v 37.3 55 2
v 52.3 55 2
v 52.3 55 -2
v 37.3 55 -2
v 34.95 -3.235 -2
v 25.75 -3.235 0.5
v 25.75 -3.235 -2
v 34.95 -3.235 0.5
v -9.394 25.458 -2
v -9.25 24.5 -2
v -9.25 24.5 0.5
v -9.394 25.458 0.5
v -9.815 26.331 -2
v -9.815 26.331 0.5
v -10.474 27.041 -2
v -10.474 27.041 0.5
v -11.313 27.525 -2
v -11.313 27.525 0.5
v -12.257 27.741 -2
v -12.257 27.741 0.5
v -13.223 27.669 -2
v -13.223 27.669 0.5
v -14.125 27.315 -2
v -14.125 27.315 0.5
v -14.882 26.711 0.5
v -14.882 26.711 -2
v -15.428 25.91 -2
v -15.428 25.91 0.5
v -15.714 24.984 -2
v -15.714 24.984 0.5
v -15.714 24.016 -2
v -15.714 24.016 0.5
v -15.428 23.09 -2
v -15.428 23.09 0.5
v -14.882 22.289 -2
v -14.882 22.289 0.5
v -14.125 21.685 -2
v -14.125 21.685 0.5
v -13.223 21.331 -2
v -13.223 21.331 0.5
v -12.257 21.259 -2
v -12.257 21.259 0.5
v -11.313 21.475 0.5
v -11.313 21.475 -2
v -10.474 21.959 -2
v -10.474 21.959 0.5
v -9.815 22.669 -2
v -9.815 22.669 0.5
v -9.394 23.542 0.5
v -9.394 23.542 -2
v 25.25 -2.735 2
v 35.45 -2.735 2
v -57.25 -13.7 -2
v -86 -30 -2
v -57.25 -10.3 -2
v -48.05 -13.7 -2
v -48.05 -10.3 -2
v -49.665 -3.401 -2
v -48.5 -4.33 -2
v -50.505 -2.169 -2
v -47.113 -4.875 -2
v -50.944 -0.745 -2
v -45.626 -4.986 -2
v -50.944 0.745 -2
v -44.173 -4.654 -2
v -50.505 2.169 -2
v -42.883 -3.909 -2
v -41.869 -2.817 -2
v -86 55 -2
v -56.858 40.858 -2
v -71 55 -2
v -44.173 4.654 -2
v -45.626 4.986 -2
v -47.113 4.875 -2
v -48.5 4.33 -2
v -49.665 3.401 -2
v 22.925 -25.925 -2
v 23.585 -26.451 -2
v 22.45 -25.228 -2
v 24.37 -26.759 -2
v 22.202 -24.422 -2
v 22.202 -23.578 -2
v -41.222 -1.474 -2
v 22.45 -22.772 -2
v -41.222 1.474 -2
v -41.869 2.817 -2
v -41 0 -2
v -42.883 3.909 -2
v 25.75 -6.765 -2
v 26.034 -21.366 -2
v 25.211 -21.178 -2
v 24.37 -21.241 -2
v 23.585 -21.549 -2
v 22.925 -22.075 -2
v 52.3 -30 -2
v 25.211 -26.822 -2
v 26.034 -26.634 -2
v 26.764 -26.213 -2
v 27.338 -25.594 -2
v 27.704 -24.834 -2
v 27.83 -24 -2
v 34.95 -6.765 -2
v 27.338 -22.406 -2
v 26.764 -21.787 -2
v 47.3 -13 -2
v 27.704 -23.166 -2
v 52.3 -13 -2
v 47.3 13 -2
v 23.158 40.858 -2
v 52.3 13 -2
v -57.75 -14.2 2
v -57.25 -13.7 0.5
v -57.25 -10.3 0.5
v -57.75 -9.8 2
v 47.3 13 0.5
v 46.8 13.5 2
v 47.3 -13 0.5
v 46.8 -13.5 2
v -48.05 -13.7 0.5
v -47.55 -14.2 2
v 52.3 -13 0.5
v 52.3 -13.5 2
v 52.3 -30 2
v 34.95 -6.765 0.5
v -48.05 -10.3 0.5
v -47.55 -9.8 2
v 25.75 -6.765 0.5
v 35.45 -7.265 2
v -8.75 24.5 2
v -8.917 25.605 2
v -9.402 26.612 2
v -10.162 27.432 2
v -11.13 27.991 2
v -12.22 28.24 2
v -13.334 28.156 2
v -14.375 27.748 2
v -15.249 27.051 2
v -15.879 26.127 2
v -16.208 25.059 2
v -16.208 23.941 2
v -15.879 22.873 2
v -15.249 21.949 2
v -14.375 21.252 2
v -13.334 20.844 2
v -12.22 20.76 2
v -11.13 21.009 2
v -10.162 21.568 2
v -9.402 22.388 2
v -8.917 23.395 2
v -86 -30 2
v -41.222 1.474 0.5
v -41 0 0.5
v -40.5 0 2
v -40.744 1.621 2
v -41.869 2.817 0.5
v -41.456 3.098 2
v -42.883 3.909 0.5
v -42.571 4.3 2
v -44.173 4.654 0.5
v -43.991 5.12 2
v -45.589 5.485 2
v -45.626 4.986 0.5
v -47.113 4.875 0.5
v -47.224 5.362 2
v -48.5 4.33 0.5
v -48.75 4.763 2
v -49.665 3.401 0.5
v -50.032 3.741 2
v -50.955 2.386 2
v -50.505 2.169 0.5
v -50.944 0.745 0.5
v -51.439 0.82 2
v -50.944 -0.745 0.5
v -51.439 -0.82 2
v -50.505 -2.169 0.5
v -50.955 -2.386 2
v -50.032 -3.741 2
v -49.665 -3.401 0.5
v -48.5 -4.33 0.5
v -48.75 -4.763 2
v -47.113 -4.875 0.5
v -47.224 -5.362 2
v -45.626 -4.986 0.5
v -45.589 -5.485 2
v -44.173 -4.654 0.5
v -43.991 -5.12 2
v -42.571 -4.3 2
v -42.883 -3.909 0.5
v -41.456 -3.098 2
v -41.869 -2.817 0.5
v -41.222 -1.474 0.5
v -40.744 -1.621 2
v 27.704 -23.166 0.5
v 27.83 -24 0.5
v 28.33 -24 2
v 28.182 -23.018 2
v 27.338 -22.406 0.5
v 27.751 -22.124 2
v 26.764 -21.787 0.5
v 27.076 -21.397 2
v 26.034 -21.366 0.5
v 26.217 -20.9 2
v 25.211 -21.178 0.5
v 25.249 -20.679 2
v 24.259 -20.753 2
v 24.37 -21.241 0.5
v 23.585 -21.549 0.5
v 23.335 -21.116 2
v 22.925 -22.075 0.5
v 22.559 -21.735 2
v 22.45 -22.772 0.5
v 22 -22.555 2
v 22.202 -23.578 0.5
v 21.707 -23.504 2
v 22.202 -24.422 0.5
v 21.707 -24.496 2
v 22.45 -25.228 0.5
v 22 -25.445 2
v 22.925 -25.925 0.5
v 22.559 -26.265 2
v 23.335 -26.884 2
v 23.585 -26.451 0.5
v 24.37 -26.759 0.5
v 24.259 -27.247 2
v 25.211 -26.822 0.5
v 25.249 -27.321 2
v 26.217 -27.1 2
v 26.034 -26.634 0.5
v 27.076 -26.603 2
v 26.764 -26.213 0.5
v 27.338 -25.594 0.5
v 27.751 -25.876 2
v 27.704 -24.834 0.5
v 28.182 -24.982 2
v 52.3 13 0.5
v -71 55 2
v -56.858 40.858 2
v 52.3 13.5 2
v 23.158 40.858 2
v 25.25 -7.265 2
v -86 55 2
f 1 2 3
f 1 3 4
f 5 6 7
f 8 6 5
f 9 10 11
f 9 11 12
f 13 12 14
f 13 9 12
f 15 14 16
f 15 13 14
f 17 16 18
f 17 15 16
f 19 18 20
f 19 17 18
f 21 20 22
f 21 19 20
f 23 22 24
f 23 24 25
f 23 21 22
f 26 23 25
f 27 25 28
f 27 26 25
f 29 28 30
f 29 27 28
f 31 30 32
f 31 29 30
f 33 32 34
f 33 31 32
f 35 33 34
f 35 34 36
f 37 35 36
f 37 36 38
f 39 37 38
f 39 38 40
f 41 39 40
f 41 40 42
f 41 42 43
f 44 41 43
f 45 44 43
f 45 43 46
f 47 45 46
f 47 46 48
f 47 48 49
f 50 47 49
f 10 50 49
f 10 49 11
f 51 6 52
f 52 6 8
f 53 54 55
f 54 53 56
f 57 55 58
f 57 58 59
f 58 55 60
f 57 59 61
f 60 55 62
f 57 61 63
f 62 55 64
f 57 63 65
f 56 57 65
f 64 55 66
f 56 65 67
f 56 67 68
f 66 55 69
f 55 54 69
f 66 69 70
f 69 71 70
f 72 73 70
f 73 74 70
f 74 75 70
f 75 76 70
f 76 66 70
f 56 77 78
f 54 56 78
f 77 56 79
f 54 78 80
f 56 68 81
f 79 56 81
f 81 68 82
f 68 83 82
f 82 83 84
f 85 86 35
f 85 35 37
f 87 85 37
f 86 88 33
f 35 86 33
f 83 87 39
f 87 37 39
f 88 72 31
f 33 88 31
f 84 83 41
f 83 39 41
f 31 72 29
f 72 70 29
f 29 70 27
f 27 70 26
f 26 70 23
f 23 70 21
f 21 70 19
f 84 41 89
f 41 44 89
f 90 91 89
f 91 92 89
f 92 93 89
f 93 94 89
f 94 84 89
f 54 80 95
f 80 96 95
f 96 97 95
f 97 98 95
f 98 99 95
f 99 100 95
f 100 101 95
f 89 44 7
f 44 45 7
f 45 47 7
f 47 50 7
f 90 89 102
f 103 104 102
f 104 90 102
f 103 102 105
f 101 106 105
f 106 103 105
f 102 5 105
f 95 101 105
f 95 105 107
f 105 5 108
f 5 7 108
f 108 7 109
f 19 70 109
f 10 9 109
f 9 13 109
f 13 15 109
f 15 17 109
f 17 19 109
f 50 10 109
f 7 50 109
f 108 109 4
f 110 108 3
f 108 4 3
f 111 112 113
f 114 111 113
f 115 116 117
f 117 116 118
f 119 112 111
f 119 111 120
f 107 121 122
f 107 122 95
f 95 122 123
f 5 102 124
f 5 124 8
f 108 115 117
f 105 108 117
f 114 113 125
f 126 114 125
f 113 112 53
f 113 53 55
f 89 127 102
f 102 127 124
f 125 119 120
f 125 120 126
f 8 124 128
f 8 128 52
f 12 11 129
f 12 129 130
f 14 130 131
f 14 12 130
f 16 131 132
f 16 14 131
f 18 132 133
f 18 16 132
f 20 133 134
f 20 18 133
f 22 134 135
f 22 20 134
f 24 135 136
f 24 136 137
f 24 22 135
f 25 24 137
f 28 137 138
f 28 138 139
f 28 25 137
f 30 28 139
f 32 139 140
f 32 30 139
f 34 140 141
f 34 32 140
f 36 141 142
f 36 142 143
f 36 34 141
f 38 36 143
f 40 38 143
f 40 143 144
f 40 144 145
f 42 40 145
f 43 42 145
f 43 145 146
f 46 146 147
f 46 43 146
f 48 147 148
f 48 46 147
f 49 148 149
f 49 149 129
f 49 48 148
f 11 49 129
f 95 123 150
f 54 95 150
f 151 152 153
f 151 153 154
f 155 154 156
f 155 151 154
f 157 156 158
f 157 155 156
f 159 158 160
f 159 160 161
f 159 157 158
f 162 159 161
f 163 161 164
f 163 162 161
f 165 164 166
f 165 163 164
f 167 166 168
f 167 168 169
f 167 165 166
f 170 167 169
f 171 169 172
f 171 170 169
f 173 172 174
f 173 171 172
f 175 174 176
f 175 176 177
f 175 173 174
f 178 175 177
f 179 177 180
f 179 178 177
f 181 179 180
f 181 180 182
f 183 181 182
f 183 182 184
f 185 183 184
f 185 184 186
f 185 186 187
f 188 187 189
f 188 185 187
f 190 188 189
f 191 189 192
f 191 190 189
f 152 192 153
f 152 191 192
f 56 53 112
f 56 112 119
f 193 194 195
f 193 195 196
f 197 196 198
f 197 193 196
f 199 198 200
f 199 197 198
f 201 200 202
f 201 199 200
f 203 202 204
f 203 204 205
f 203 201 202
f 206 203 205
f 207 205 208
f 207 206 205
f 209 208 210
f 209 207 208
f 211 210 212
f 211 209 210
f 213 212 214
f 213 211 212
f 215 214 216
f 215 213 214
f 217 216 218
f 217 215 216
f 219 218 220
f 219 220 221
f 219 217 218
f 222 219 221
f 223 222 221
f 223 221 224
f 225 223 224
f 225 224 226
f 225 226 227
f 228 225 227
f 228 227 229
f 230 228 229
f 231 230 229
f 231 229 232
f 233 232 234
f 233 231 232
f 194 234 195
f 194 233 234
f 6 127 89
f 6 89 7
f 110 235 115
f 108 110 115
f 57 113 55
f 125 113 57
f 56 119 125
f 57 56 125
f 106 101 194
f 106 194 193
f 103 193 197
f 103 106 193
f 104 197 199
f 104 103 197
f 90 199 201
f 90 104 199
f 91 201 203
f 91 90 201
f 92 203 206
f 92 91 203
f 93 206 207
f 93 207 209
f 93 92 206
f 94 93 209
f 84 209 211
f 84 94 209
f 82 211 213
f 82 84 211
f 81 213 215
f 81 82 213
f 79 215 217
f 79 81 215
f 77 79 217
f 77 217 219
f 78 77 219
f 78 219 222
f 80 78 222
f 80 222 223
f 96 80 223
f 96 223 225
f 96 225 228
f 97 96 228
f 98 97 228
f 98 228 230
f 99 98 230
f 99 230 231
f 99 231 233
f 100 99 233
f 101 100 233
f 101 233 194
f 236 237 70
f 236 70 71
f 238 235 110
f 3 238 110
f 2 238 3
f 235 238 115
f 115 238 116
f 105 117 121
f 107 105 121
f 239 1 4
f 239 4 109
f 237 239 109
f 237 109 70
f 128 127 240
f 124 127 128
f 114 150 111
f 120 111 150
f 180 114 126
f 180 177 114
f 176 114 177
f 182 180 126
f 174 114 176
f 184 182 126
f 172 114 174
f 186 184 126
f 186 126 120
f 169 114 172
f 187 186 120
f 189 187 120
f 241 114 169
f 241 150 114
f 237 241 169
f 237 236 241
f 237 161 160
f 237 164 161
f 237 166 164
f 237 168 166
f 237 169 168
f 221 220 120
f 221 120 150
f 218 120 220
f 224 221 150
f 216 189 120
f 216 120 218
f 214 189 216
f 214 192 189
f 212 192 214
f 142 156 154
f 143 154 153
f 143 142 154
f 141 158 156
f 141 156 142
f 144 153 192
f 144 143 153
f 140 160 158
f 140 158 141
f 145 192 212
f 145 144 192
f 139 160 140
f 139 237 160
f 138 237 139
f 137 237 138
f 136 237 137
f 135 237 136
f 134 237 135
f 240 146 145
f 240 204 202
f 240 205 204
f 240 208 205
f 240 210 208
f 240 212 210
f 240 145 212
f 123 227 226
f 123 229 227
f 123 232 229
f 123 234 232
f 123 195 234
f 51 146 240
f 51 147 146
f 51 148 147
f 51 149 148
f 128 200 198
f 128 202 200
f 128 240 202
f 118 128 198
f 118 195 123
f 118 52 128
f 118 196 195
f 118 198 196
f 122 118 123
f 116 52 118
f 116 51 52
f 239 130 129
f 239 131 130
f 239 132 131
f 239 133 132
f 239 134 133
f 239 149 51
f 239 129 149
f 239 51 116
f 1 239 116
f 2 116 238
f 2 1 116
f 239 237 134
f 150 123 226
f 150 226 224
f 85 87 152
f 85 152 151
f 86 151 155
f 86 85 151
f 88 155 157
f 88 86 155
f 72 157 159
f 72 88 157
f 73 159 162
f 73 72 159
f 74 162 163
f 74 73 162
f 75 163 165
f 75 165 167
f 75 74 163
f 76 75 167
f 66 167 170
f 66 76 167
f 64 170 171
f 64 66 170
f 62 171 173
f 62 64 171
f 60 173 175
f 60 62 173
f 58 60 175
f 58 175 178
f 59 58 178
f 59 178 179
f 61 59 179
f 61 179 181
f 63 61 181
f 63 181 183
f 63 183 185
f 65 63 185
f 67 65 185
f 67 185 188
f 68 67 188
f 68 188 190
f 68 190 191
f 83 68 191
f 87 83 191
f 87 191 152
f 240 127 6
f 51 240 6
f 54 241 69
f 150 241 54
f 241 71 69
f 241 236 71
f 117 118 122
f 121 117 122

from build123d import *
from OCP.BRepFilletAPI import BRepFilletAPI_MakeChamfer

# Parameters (mm, degrees)
SKETCH1_R           = 5
SKETCH1_R_2         = 2.83
SKETCH1_R_3         = 3.25
SKETCH1_W           = 9.2
SKETCH1_H           = 3.53
SKETCH1_H_2         = 3.4
BOSS_EXTRUDE1_DEPTH = 2
BOSS_EXTRUDE2_DEPTH = 2
CHAMFER1_SIZE       = 0.5
CHAMFER1_SIZE2      = 1.5
CHAMFER2_SIZE       = 1.5
CHAMFER2_SIZE2      = 0.5


with BuildPart() as part:
    # Sketch1 → Boss-Extrude1 (new, symmetric)
    with BuildSketch(Plane.XY):
        Polygon((-86, -30), (-86, 30), (52.3, 30), (52.3, 13), (47.3, 13), (47.3, -13), (52.3, -13), (52.3, -30), align=None)
        with Locations((-46, 0)):
            Circle(SKETCH1_R, mode=Mode.SUBTRACT)
        with Locations((25, -24)):
            Circle(SKETCH1_R_2, mode=Mode.SUBTRACT)
        with Locations((-12.5, 24.5)):
            Circle(SKETCH1_R_3, mode=Mode.SUBTRACT)
        with Locations((30.35, -5)):
            Rectangle(SKETCH1_W, SKETCH1_H, mode=Mode.SUBTRACT)
        with Locations((-52.65, -12)):
            Rectangle(SKETCH1_W, SKETCH1_H_2, mode=Mode.SUBTRACT)
    extrude(amount=BOSS_EXTRUDE1_DEPTH, both=True)

    # Sketch2 → Boss-Extrude2 (add, symmetric)
    with BuildSketch(Plane.XY):
        Polygon((-86, 30), (52.3, 30), (52.3, 55), (37.3, 55), (23.157864376, 40.857864376), (-56.857864376, 40.857864376), (-71, 55), (-86, 55), align=None)
    extrude(amount=BOSS_EXTRUDE2_DEPTH, both=True)

    # Chamfer1
    chamfer1_edges = [part.edges().sort_by_distance(p)[0] for p in [
        (-57.25, -12, 2),
        (-52.65, -13.7, 2),
        (-48.05, -12, 2),
        (-52.65, -10.3, 2),
        (-15.75, 24.5, 2),
        (-51, 0, 2),
        (25.75, -5, 2),
        (30.35, -6.765, 2),
        (34.95, -5, 2),
        (30.35, -3.235, 2),
        (22.17, -24, 2),
    ]]
    chamfer1_side = [part.faces().sort_by_distance(p)[0] for p in [
        (-17.641163969, 8.221234178, 2),
    ]]
    chamfer(chamfer1_edges, length=CHAMFER1_SIZE, length2=CHAMFER1_SIZE2, reference=chamfer1_side[0])

    # Chamfer2: one chamfer whose edges measure the first distance from different faces: ONE call of the kernel's chamfer builder (chamfer() names one face for all edges)
    chamfer2_edges_1 = [part.edges().sort_by_distance(p)[0] for p in [
        (49.8, -13, 2),
    ]]
    chamfer2_side_1 = [part.faces().sort_by_distance(p)[0] for p in [
        (49.8, -13, 0),
    ]]
    chamfer2_edges_2 = [part.edges().sort_by_distance(p)[0] for p in [
        (47.3, 0, 2),
    ]]
    chamfer2_side_2 = [part.faces().sort_by_distance(p)[0] for p in [
        (47.3, 0, 0),
    ]]
    chamfer2_edges_3 = [part.edges().sort_by_distance(p)[0] for p in [
        (49.8, 13, 2),
    ]]
    chamfer2_side_3 = [part.faces().sort_by_distance(p)[0] for p in [
        (49.8, 13, 0),
    ]]
    chamfer2 = BRepFilletAPI_MakeChamfer(part.part.solid().wrapped)
    for e in chamfer2_edges_1:
        chamfer2.Add(CHAMFER2_SIZE, CHAMFER2_SIZE2, e.wrapped, chamfer2_side_1[0].wrapped)  # the first distance lies on this face
    for e in chamfer2_edges_2:
        chamfer2.Add(CHAMFER2_SIZE, CHAMFER2_SIZE2, e.wrapped, chamfer2_side_2[0].wrapped)  # the first distance lies on this face
    for e in chamfer2_edges_3:
        chamfer2.Add(CHAMFER2_SIZE, CHAMFER2_SIZE2, e.wrapped, chamfer2_side_3[0].wrapped)  # the first distance lies on this face
    add(Compound.cast(chamfer2.Shape()), mode=Mode.REPLACE)


solid = part.part
